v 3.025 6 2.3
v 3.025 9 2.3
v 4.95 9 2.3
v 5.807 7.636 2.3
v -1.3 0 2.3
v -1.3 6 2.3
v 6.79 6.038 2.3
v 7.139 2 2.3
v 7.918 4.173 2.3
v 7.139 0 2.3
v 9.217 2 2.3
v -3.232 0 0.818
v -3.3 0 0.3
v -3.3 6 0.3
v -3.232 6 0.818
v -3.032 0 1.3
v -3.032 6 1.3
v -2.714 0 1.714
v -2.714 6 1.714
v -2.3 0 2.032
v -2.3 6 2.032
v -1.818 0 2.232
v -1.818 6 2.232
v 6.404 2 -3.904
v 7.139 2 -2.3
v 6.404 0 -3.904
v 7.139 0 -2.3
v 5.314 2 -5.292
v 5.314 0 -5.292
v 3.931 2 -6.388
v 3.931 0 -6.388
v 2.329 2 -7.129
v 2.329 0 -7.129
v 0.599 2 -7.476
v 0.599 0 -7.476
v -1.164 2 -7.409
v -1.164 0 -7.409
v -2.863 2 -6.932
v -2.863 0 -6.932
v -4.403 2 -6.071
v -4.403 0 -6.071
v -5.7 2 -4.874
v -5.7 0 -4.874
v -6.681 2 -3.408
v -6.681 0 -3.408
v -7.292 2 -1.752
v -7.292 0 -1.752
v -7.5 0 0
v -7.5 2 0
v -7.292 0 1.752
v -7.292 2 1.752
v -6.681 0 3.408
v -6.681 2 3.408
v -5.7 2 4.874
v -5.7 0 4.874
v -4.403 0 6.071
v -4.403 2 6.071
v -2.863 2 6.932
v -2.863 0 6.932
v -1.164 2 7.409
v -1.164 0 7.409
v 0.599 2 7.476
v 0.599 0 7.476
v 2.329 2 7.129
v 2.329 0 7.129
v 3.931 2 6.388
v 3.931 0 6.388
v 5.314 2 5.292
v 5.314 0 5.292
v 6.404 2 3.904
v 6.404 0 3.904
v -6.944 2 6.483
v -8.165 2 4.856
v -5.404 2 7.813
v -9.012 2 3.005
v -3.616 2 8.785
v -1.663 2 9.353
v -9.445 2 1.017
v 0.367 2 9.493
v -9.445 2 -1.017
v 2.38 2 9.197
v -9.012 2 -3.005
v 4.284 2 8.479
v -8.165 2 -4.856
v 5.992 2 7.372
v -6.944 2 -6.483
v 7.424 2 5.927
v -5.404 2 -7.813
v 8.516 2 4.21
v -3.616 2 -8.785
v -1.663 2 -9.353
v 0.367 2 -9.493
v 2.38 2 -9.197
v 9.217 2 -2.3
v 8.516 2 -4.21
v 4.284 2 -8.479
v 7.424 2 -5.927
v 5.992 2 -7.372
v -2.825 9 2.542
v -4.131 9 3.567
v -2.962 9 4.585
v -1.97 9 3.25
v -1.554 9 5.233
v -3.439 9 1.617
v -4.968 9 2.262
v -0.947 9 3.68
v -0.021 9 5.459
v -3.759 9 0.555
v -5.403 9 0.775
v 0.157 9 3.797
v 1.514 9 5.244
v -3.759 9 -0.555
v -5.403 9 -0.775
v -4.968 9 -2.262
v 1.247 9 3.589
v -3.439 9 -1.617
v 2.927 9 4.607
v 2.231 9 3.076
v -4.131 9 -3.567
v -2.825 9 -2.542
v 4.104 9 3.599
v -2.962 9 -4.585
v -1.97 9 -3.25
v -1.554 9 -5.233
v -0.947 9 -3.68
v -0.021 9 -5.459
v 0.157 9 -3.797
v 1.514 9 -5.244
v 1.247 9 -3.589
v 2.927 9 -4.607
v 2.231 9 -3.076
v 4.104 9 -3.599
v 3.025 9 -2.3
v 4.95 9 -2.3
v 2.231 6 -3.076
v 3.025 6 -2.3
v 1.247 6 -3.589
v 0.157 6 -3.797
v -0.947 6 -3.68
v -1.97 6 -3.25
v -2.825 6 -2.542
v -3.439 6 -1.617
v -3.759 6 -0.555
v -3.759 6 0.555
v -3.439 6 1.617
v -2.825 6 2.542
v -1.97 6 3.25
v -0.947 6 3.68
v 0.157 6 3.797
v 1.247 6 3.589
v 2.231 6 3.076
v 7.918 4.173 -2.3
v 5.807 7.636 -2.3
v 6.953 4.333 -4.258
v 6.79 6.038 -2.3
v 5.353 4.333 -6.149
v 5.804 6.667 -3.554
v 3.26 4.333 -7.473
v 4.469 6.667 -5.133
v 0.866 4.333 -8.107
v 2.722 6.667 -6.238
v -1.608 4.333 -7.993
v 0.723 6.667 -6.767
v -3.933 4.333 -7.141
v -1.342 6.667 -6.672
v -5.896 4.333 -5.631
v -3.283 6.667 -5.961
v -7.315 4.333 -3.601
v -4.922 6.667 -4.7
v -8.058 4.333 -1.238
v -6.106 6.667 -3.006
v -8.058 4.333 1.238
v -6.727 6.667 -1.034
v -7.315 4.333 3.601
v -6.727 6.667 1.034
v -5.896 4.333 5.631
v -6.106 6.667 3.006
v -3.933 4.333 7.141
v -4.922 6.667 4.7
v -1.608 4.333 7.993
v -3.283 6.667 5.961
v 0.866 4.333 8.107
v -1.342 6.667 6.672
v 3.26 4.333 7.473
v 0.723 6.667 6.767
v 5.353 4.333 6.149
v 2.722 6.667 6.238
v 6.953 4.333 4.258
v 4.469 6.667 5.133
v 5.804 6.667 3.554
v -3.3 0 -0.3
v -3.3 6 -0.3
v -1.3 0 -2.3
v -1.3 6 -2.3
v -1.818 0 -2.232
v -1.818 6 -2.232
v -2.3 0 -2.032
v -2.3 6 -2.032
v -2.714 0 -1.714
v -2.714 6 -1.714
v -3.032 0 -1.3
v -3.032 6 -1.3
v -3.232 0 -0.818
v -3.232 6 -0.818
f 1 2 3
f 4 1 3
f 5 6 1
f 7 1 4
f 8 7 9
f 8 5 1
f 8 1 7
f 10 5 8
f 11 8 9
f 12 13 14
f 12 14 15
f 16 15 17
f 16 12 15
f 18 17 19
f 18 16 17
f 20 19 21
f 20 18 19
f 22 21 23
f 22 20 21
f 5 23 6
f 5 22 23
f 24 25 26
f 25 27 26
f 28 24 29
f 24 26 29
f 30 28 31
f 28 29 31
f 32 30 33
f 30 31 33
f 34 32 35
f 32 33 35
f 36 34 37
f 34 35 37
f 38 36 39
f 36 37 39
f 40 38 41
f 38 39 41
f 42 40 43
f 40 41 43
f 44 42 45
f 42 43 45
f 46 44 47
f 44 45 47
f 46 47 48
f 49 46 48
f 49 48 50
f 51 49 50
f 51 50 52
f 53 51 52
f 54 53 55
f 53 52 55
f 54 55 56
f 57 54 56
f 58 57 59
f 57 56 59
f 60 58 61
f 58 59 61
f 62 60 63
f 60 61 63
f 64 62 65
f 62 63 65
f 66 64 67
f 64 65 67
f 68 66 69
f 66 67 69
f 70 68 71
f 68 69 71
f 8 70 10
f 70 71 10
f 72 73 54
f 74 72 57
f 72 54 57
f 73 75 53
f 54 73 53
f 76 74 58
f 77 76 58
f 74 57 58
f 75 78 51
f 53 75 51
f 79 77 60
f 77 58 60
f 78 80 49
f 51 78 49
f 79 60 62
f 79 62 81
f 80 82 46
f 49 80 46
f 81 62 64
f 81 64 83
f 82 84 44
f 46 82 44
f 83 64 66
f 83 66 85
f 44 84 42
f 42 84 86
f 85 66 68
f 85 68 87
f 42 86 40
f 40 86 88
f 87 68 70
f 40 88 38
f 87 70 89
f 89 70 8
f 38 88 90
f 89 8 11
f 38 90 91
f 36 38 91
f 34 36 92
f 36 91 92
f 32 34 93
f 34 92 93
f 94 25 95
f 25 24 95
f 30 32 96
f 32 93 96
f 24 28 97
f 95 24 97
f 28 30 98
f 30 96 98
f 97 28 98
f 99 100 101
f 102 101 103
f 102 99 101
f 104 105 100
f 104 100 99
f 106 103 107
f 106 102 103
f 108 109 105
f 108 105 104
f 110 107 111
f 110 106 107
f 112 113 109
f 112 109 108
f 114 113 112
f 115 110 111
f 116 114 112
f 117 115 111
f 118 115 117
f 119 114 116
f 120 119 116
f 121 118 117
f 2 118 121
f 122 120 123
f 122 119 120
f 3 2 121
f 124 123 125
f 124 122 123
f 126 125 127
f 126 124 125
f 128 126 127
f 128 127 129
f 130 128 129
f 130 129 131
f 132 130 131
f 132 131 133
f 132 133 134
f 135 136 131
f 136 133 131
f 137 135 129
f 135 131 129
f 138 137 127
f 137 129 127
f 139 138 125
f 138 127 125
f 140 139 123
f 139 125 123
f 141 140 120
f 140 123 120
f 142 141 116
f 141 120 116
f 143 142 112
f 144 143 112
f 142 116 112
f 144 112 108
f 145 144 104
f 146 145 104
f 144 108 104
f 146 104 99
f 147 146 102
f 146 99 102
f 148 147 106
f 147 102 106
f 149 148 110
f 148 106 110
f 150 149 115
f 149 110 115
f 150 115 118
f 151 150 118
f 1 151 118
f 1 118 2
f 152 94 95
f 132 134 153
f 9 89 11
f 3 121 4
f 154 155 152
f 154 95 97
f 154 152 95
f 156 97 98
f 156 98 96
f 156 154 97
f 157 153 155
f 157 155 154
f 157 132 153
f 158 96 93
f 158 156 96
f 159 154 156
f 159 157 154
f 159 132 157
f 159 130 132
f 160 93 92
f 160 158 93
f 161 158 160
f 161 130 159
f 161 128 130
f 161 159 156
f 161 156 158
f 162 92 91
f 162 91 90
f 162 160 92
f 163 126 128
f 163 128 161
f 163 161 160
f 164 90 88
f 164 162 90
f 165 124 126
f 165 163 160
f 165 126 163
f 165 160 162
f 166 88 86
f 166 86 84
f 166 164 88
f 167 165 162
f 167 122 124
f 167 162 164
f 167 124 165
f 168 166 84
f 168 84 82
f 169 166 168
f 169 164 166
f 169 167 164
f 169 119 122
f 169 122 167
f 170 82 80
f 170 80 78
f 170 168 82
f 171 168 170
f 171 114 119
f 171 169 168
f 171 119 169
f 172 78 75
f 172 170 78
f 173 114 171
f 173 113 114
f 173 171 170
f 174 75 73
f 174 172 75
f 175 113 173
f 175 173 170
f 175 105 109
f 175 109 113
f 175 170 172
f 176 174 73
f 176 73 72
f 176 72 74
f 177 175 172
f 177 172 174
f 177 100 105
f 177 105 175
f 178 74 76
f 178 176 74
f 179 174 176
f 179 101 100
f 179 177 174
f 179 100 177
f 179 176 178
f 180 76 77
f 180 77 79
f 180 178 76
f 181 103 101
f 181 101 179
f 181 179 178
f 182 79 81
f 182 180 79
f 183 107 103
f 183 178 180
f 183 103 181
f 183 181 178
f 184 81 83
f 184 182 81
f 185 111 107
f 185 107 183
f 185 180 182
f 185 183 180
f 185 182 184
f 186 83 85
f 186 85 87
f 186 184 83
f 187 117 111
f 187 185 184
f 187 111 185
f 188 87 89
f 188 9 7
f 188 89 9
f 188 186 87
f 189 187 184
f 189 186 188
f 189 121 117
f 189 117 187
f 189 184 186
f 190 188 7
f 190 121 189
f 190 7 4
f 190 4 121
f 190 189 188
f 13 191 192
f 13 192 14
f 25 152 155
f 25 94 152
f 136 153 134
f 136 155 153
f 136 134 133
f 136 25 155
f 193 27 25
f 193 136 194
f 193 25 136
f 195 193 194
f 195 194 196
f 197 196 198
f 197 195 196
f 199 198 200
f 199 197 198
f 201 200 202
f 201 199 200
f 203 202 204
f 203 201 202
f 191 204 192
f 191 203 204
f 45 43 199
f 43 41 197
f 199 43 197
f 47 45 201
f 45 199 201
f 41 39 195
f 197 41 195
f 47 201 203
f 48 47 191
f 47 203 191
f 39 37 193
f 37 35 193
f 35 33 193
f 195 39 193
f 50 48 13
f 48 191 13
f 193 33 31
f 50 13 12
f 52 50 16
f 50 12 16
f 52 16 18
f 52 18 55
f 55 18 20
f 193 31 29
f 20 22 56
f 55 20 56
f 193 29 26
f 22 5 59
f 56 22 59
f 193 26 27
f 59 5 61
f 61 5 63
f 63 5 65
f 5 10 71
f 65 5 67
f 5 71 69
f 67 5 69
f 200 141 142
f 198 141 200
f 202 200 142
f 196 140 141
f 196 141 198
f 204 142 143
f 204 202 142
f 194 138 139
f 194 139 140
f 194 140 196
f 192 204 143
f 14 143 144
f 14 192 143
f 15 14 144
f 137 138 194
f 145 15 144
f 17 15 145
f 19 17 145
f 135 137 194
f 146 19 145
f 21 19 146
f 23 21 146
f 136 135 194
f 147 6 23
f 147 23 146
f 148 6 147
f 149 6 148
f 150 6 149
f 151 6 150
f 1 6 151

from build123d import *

# Parameters (mm, degrees)
SKETCH_1_R          = 7.5
EXTRUDE_1_DEPTH     = 2
SKETCH_2_R          = 9.5
EXTRUDE_2_DEPTH     = 7
EXTRUDE_2_TAPER     = 30
SKETCH_4_R          = 3.8
CUT_EXTRUDE_1_DEPTH = 3
CUT_EXTRUDE_2_DEPTH = 17.170961802


with BuildPart() as part:
    # 草图1 → 凸台-拉伸1 (new body)
    with BuildSketch(Plane(origin=(0, 0, 0), x_dir=(1, 0, 0), z_dir=(0, 1, 0))):
        with Locations(Location((0, 0, 0), (0, 0, 270))):
            Circle(SKETCH_1_R)
    extrude(amount=EXTRUDE_1_DEPTH)

    # 草图2 → 凸台-拉伸2 (add)
    with BuildSketch(Plane(origin=(0, 2, 0), x_dir=(1, 0, 0), z_dir=(0, 1, 0))):
        Circle(SKETCH_2_R)
    extrude(amount=EXTRUDE_2_DEPTH, taper=EXTRUDE_2_TAPER)

    # 草图4 → 切除-拉伸1 (cut)
    with BuildSketch(Plane(origin=(0, 9, 0), x_dir=(1, 0, 0), z_dir=(0, 1, 0))):
        with Locations(Location((0, 0, 0), (0, 0, 270))):
            Circle(SKETCH_4_R)
    extrude(amount=-CUT_EXTRUDE_1_DEPTH, mode=Mode.SUBTRACT)

    # 草图5 → 切除-拉伸2 (cut, through all)
    with BuildSketch(Plane(origin=(0, 0, 0), x_dir=(-1, 0, 0), z_dir=(0, -1, 0))):
        with BuildLine():
            Line((1.3, -2.3), (-11.887634873, -2.3))
            Line((-11.887634873, -2.3), (-11.887634873, 2.3))
            Line((-11.887634873, 2.3), (1.3, 2.3))
            ThreePointArc((1.3, 2.3), (2.714213562, 1.714213562), (3.3, 0.3))
            Line((3.3, 0.3), (3.3, -0.3))
            ThreePointArc((3.3, -0.3), (2.714213562, -1.714213562), (1.3, -2.3))
        make_face()
    extrude(amount=-CUT_EXTRUDE_2_DEPTH, mode=Mode.SUBTRACT)


solid = part.part
